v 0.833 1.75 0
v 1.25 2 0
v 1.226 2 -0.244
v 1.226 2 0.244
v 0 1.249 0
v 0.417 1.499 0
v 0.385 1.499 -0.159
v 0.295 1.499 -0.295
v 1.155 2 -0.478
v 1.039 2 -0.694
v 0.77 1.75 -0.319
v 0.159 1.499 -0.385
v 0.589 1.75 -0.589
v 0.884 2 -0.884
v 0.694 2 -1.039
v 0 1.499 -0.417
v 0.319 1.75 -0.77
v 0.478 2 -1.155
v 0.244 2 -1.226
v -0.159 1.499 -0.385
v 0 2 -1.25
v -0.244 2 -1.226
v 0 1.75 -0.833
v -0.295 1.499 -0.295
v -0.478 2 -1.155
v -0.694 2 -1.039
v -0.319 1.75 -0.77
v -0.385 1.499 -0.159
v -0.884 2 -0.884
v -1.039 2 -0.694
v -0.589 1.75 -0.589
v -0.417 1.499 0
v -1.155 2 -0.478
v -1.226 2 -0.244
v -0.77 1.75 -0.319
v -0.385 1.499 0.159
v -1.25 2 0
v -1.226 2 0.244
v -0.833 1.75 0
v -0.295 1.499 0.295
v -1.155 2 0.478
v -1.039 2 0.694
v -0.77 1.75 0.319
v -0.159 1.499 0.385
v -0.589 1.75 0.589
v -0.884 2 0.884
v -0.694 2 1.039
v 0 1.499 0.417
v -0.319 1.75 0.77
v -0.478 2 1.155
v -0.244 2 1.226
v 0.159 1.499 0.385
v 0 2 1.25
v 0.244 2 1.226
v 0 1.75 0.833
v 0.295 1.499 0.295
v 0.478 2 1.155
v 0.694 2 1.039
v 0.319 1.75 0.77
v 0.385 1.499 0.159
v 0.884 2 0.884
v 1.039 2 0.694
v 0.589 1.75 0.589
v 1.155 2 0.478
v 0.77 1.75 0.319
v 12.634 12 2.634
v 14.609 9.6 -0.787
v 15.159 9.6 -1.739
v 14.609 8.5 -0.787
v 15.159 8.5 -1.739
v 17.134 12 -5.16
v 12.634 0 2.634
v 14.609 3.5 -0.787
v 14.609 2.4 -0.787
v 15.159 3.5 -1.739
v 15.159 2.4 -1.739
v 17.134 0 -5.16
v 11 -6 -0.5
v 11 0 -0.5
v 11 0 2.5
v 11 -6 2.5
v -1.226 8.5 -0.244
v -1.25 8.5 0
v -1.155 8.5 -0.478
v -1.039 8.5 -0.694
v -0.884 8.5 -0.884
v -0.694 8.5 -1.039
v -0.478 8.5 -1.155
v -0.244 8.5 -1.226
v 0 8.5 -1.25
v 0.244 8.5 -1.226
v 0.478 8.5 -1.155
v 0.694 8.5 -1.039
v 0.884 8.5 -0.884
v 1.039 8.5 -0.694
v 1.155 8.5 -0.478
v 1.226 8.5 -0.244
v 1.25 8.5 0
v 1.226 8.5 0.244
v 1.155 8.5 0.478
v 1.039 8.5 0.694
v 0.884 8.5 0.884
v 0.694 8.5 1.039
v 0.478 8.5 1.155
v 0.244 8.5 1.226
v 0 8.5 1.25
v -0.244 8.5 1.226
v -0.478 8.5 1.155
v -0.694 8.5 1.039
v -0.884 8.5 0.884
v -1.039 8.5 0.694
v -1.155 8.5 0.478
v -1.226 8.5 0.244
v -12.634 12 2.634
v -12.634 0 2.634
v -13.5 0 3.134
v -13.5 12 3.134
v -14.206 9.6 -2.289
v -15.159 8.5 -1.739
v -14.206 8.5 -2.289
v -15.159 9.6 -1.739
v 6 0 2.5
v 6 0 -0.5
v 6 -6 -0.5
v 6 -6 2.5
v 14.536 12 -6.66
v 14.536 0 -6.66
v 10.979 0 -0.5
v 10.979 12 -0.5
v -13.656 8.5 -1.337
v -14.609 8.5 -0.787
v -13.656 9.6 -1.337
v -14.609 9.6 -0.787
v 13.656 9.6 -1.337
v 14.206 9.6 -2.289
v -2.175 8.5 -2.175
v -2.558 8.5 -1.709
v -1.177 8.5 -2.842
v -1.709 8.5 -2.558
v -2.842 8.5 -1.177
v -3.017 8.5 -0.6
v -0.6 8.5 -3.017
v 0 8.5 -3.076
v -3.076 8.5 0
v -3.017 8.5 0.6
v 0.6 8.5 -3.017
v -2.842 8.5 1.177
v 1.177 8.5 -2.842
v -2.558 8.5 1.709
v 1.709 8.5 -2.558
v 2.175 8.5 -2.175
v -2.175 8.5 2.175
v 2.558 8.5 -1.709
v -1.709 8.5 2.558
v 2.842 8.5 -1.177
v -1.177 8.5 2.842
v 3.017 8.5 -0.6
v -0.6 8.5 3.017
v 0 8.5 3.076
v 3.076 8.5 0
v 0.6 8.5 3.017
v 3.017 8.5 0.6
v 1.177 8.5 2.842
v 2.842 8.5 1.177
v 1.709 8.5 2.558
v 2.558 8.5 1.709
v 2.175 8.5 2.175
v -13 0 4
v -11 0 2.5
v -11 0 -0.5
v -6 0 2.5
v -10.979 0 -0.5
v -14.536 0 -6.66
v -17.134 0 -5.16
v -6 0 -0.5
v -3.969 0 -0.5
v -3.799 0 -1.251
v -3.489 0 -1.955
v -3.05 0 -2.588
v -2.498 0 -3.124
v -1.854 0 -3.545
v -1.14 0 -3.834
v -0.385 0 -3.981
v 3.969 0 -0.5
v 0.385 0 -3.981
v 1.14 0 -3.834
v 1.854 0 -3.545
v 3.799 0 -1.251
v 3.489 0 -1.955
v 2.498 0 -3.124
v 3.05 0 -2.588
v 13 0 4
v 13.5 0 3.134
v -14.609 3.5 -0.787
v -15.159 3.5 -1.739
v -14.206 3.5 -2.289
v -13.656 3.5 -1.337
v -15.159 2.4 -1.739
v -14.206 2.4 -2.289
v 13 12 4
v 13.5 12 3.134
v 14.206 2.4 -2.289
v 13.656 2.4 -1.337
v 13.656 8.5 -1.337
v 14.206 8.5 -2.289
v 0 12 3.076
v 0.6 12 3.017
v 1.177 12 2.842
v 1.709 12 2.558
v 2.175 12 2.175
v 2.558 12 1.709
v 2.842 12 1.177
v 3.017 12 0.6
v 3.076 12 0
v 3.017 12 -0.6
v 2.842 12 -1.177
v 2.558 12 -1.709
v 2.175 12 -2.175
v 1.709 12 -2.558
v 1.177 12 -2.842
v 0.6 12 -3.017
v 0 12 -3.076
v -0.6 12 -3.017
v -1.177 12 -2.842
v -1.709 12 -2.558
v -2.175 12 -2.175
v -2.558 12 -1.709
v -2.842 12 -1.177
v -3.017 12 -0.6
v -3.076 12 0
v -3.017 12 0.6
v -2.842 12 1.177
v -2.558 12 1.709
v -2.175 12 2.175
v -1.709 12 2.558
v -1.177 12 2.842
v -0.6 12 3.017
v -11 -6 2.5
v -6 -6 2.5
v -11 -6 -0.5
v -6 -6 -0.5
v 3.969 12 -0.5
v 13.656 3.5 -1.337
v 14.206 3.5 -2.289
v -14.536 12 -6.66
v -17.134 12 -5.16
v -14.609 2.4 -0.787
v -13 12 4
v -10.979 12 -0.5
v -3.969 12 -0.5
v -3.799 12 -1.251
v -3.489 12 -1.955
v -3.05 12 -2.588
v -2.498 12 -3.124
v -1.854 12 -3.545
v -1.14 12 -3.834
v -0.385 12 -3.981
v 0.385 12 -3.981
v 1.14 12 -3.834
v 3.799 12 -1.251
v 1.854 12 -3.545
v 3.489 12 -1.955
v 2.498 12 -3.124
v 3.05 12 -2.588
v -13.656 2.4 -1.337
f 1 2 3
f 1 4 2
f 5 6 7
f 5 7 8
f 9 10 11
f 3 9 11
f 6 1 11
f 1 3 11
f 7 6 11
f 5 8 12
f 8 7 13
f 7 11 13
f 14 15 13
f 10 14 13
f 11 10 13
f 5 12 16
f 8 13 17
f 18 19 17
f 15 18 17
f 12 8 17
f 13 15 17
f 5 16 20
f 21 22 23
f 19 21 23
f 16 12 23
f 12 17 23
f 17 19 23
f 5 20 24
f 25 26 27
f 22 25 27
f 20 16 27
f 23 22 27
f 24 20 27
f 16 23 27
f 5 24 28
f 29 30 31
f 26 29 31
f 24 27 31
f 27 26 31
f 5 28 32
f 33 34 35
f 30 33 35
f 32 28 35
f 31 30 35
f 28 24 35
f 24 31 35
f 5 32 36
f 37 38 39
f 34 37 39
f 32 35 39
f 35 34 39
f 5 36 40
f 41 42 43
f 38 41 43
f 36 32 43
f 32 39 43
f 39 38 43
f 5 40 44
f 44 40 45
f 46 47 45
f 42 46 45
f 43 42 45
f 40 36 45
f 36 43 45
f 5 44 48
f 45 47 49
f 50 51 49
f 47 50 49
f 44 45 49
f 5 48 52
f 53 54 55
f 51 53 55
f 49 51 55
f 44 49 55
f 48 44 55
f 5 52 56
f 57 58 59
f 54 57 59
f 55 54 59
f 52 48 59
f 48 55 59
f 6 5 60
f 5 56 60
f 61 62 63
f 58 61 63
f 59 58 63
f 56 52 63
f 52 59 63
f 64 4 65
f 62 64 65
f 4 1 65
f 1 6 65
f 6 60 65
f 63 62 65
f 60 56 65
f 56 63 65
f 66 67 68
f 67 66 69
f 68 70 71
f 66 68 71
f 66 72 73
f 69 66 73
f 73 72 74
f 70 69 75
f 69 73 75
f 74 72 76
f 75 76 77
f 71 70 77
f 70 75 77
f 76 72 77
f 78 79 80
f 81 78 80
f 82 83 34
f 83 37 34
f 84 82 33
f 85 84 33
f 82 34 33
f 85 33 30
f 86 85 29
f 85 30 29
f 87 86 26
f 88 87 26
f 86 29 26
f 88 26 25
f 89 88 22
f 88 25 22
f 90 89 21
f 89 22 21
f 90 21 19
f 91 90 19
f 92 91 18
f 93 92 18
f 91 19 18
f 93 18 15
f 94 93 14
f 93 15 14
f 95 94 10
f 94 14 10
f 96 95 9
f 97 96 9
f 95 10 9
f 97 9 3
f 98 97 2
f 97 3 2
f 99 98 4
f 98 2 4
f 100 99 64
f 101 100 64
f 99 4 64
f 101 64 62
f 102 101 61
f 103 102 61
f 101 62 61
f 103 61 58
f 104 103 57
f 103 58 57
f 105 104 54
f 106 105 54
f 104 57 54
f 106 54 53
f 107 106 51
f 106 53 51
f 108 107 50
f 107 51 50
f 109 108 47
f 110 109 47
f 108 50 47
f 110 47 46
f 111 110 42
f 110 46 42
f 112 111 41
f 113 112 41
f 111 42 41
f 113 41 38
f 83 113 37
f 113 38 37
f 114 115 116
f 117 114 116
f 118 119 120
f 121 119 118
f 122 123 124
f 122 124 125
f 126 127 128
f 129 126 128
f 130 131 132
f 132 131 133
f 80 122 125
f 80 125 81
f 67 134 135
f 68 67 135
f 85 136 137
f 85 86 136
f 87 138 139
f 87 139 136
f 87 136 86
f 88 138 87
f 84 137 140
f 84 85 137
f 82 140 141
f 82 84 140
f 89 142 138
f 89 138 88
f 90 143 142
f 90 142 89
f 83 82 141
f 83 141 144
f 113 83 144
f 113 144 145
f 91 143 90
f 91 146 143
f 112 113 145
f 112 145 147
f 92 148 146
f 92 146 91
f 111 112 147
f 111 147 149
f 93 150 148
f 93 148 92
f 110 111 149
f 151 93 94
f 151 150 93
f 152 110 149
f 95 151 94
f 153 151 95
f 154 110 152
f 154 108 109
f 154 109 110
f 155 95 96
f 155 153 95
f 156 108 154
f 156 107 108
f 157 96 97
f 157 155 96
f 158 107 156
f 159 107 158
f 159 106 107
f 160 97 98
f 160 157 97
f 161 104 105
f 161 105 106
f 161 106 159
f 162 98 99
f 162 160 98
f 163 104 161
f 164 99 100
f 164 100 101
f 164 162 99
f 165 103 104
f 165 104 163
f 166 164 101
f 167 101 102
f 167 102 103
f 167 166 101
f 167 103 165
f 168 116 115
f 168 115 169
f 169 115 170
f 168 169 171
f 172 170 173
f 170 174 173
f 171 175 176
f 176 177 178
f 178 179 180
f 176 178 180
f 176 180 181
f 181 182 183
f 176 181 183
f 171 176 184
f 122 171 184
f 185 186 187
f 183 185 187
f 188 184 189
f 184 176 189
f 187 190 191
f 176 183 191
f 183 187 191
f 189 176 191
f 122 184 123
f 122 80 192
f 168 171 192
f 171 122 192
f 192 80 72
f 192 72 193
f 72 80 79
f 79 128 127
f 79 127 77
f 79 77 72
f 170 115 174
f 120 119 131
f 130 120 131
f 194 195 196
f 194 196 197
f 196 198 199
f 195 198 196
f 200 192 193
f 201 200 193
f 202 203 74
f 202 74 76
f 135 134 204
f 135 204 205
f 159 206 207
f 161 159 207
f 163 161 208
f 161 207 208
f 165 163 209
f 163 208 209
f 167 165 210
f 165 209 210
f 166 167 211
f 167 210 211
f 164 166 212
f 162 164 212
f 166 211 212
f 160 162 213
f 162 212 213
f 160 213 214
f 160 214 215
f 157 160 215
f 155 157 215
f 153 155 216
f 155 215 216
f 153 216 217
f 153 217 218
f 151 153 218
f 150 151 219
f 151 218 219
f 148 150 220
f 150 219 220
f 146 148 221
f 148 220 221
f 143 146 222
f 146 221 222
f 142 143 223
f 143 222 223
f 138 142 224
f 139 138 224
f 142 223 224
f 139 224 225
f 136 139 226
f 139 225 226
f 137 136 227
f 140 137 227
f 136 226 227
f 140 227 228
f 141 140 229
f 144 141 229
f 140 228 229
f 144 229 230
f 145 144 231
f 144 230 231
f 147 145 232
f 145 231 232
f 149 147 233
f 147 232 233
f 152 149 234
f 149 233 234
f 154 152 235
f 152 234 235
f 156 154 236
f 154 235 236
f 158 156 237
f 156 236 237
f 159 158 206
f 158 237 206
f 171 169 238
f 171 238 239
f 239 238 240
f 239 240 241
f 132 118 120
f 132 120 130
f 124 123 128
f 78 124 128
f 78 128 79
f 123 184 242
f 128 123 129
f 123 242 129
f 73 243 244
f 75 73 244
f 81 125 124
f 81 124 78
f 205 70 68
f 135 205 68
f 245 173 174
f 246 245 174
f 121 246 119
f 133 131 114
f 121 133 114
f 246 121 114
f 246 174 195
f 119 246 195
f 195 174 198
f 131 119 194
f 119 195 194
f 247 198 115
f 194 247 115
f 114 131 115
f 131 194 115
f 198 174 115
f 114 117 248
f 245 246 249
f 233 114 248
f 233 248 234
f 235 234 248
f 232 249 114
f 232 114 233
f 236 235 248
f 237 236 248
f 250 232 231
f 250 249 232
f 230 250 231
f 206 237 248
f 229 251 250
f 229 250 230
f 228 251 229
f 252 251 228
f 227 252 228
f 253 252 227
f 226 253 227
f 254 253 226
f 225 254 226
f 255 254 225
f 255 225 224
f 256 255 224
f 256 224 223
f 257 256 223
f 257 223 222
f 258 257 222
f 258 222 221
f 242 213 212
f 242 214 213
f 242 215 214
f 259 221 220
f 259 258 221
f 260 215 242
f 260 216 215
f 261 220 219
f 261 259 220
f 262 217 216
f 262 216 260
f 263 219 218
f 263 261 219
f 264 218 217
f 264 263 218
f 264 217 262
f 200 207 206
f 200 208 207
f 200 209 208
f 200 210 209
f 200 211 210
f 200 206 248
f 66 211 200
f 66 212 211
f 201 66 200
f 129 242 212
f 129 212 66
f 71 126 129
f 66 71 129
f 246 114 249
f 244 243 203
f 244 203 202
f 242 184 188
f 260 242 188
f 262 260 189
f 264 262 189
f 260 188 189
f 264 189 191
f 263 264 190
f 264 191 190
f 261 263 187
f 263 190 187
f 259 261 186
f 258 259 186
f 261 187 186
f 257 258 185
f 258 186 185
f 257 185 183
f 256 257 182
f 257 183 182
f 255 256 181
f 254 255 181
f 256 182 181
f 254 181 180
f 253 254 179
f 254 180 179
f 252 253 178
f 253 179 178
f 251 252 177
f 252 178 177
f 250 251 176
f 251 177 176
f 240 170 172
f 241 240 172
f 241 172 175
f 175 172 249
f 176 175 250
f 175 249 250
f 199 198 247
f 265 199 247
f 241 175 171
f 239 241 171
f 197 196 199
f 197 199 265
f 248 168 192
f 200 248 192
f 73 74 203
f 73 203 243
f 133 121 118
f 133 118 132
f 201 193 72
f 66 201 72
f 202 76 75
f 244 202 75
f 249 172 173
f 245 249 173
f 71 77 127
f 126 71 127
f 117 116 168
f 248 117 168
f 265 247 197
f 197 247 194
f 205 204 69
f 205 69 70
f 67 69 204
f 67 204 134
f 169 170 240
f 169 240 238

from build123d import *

# Parameters (mm, degrees)
BOSS_EXTRUDE1_DEPTH            = 12
F_2_5_2_5_DIAMETER_HOLE1_D     = 2.5
F_2_5_2_5_DIAMETER_HOLE1_DEPTH = 10
F_2_5_2_5_DIAMETER_HOLE1_TIP   = 0.751075774
SKETCH4_R                      = 3.0762
CUT_EXTRUDE1_DEPTH             = 3.5
SKETCH5_W                      = 5
SKETCH5_H                      = 3
BOSS_EXTRUDE2_DEPTH            = 6
SKETCH7_W                      = 1.1
SKETCH7_H                      = 1.1
CUT_EXTRUDE3_DEPTH             = 1.1
SKETCH8_W                      = 1.1
SKETCH8_H                      = 1.1
CUT_EXTRUDE4_DEPTH             = 1.1


with BuildPart() as part:
    # Sketch1 → Boss-Extrude1 (new body)
    with BuildSketch(Plane(origin=(0, 0, 0), x_dir=(1, 0, 0), z_dir=(0, 1, 0))):
        with BuildLine():
            Line((-13, -4), (13, -4))
            Line((13, -4), (13.5, -3.133974596))
            Line((13.5, -3.133974596), (12.633974596, -2.633974596))
            Line((12.633974596, -2.633974596), (17.133974596, 5.160254038))
            Line((17.133974596, 5.160254038), (14.535898385, 6.660254038))
            Line((14.535898385, 6.660254038), (10.979274058, 0.5))
            Line((10.979274058, 0.5), (3.968626967, 0.5))
            ThreePointArc((3.968626967, 0.5), (0, 4), (-3.968626967, 0.5))
            Line((-3.968626967, 0.5), (-10.979274058, 0.5))
            Line((-10.979274058, 0.5), (-14.535898385, 6.660254038))
            Line((-14.535898385, 6.660254038), (-17.133974596, 5.160254038))
            Line((-17.133974596, 5.160254038), (-12.633974596, -2.633974596))
            Line((-12.633974596, -2.633974596), (-13.5, -3.133974596))
            Line((-13.5, -3.133974596), (-13, -4))
        make_face()
    extrude(amount=BOSS_EXTRUDE1_DEPTH)

    # Ø2.5 (2.5) Diameter Hole1
    with Locations(Plane(origin=(0, 12, 0), x_dir=(1, 0, 0), z_dir=(0, 1, 0))):
        with Locations((0, 0)):
            Hole(F_2_5_2_5_DIAMETER_HOLE1_D / 2, depth=F_2_5_2_5_DIAMETER_HOLE1_DEPTH)
            with Locations((0, 0, -(F_2_5_2_5_DIAMETER_HOLE1_DEPTH + F_2_5_2_5_DIAMETER_HOLE1_TIP / 2))):  # 118° drill point
                Cone(0, F_2_5_2_5_DIAMETER_HOLE1_D / 2, F_2_5_2_5_DIAMETER_HOLE1_TIP, mode=Mode.SUBTRACT)

    # Sketch4 → Cut-Extrude1 (cut)
    with BuildSketch(Plane(origin=(0, 12, 0), x_dir=(1, 0, 0), z_dir=(0, 1, 0))):
        with Locations(Location((0, 0, 0), (0, 0, 270))):
            Circle(SKETCH4_R)
    extrude(amount=-CUT_EXTRUDE1_DEPTH, mode=Mode.SUBTRACT)

    # Sketch5 → Boss-Extrude2 (add)
    with BuildSketch(Plane.XZ):
        with Locations((8.5, 1)):
            Rectangle(SKETCH5_W, SKETCH5_H)
        with Locations((-8.5, 1)):
            Rectangle(SKETCH5_W, SKETCH5_H)
    extrude(amount=BOSS_EXTRUDE2_DEPTH)

    # Sketch7 → Cut-Extrude3 (cut)
    with BuildSketch(Plane(origin=(-10.616025404, 0, 6.129165125), x_dir=(0.49999999999999906, 0, 0.8660254037844393), z_dir=(-0.8660254037844392, 0, 0.499999999999999))):
        with Locations((-8.535898385, 9.05)):
            Rectangle(SKETCH7_W, SKETCH7_H)
        with Locations((-8.535898385, 2.95)):
            Rectangle(SKETCH7_W, SKETCH7_H)
    extrude(amount=-CUT_EXTRUDE3_DEPTH, mode=Mode.SUBTRACT)

    # Sketch8 → Cut-Extrude4 (cut)
    with BuildSketch(Plane(origin=(10.616025404, 0, 6.129165125), x_dir=(0.4999999999999978, 0, -0.86602540378444), z_dir=(0.86602540378444, 0, 0.4999999999999978))):
        with Locations((8.535898385, 9.05)):
            Rectangle(SKETCH8_W, SKETCH8_H)
        with Locations((8.535898385, 2.95)):
            Rectangle(SKETCH8_W, SKETCH8_H)
    extrude(amount=-CUT_EXTRUDE4_DEPTH, mode=Mode.SUBTRACT)


solid = part.part
